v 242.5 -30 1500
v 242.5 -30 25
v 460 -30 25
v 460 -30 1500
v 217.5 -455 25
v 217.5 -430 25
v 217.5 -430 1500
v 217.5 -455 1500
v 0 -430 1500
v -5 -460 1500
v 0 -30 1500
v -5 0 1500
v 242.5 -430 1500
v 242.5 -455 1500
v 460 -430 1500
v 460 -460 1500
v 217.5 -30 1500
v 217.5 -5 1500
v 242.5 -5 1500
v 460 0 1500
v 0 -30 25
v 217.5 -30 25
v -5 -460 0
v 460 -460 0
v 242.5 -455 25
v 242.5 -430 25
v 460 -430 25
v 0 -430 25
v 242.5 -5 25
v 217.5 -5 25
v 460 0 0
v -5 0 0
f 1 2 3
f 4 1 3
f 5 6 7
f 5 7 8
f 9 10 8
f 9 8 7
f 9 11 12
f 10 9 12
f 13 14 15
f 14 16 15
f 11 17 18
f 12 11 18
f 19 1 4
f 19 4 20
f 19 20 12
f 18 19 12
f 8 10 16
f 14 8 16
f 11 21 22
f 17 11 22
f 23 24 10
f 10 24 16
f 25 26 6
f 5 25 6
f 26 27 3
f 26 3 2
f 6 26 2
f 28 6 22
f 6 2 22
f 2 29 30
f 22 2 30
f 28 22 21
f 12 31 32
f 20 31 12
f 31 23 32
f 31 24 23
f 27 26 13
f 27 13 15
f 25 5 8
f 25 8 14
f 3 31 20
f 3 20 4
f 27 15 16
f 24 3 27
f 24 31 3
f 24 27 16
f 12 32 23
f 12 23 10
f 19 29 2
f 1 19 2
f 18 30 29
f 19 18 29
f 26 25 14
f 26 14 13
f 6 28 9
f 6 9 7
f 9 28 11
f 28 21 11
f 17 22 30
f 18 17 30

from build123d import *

# Parameters (mm, degrees)
BOSS_EXTRUDE1_DEPTH   = 1500
BOSS_EXTRUDE1_2_DEPTH = 1500
SKETCH5_W             = 460
SKETCH5_H             = 460
BOSS_EXTRUDE5_DEPTH   = 25
SKETCH6_W             = 1500
SKETCH6_H             = 460
BOSS_EXTRUDE6_DEPTH   = 5


with BuildPart() as part:
    # Sketch1 → Boss-Extrude1 (new body)
    with BuildSketch(Plane.XY):
        Polygon((0, -30), (217.5, -30), (217.5, -5), (242.5, -5), (242.5, -30), (460, -30), (460, 0), (0, 0), align=None)
    extrude(amount=BOSS_EXTRUDE1_DEPTH)



with BuildPart() as body_2:
    # Sketch1 → Boss-Extrude1 2 (new body)
    with BuildSketch(Plane.XY):
        Polygon((242.5, -430), (460, -430), (460, -460), (0, -460), (0, -430), (217.5, -430), (217.5, -455), (242.5, -455), align=None)
    extrude(amount=BOSS_EXTRUDE1_2_DEPTH)


with BuildPart() as part_1:
    add(part.part)

    add(body_2.part)  # Boss-Extrude5 merges body 2
    # Sketch5 → Boss-Extrude5 (add)
    with BuildSketch(Plane(origin=(0, 0, 0), x_dir=(-1, 0, 0), z_dir=(0, 0, -1))):
        with Locations((-230, -230)):
            Rectangle(SKETCH5_W, SKETCH5_H)
    extrude(amount=-BOSS_EXTRUDE5_DEPTH)

    # Sketch6 → Boss-Extrude6 (add)
    with BuildSketch(Plane.ZY):
        with Locations((750, -230)):
            Rectangle(SKETCH6_W, SKETCH6_H)
    extrude(amount=BOSS_EXTRUDE6_DEPTH)


solid = part_1.part
